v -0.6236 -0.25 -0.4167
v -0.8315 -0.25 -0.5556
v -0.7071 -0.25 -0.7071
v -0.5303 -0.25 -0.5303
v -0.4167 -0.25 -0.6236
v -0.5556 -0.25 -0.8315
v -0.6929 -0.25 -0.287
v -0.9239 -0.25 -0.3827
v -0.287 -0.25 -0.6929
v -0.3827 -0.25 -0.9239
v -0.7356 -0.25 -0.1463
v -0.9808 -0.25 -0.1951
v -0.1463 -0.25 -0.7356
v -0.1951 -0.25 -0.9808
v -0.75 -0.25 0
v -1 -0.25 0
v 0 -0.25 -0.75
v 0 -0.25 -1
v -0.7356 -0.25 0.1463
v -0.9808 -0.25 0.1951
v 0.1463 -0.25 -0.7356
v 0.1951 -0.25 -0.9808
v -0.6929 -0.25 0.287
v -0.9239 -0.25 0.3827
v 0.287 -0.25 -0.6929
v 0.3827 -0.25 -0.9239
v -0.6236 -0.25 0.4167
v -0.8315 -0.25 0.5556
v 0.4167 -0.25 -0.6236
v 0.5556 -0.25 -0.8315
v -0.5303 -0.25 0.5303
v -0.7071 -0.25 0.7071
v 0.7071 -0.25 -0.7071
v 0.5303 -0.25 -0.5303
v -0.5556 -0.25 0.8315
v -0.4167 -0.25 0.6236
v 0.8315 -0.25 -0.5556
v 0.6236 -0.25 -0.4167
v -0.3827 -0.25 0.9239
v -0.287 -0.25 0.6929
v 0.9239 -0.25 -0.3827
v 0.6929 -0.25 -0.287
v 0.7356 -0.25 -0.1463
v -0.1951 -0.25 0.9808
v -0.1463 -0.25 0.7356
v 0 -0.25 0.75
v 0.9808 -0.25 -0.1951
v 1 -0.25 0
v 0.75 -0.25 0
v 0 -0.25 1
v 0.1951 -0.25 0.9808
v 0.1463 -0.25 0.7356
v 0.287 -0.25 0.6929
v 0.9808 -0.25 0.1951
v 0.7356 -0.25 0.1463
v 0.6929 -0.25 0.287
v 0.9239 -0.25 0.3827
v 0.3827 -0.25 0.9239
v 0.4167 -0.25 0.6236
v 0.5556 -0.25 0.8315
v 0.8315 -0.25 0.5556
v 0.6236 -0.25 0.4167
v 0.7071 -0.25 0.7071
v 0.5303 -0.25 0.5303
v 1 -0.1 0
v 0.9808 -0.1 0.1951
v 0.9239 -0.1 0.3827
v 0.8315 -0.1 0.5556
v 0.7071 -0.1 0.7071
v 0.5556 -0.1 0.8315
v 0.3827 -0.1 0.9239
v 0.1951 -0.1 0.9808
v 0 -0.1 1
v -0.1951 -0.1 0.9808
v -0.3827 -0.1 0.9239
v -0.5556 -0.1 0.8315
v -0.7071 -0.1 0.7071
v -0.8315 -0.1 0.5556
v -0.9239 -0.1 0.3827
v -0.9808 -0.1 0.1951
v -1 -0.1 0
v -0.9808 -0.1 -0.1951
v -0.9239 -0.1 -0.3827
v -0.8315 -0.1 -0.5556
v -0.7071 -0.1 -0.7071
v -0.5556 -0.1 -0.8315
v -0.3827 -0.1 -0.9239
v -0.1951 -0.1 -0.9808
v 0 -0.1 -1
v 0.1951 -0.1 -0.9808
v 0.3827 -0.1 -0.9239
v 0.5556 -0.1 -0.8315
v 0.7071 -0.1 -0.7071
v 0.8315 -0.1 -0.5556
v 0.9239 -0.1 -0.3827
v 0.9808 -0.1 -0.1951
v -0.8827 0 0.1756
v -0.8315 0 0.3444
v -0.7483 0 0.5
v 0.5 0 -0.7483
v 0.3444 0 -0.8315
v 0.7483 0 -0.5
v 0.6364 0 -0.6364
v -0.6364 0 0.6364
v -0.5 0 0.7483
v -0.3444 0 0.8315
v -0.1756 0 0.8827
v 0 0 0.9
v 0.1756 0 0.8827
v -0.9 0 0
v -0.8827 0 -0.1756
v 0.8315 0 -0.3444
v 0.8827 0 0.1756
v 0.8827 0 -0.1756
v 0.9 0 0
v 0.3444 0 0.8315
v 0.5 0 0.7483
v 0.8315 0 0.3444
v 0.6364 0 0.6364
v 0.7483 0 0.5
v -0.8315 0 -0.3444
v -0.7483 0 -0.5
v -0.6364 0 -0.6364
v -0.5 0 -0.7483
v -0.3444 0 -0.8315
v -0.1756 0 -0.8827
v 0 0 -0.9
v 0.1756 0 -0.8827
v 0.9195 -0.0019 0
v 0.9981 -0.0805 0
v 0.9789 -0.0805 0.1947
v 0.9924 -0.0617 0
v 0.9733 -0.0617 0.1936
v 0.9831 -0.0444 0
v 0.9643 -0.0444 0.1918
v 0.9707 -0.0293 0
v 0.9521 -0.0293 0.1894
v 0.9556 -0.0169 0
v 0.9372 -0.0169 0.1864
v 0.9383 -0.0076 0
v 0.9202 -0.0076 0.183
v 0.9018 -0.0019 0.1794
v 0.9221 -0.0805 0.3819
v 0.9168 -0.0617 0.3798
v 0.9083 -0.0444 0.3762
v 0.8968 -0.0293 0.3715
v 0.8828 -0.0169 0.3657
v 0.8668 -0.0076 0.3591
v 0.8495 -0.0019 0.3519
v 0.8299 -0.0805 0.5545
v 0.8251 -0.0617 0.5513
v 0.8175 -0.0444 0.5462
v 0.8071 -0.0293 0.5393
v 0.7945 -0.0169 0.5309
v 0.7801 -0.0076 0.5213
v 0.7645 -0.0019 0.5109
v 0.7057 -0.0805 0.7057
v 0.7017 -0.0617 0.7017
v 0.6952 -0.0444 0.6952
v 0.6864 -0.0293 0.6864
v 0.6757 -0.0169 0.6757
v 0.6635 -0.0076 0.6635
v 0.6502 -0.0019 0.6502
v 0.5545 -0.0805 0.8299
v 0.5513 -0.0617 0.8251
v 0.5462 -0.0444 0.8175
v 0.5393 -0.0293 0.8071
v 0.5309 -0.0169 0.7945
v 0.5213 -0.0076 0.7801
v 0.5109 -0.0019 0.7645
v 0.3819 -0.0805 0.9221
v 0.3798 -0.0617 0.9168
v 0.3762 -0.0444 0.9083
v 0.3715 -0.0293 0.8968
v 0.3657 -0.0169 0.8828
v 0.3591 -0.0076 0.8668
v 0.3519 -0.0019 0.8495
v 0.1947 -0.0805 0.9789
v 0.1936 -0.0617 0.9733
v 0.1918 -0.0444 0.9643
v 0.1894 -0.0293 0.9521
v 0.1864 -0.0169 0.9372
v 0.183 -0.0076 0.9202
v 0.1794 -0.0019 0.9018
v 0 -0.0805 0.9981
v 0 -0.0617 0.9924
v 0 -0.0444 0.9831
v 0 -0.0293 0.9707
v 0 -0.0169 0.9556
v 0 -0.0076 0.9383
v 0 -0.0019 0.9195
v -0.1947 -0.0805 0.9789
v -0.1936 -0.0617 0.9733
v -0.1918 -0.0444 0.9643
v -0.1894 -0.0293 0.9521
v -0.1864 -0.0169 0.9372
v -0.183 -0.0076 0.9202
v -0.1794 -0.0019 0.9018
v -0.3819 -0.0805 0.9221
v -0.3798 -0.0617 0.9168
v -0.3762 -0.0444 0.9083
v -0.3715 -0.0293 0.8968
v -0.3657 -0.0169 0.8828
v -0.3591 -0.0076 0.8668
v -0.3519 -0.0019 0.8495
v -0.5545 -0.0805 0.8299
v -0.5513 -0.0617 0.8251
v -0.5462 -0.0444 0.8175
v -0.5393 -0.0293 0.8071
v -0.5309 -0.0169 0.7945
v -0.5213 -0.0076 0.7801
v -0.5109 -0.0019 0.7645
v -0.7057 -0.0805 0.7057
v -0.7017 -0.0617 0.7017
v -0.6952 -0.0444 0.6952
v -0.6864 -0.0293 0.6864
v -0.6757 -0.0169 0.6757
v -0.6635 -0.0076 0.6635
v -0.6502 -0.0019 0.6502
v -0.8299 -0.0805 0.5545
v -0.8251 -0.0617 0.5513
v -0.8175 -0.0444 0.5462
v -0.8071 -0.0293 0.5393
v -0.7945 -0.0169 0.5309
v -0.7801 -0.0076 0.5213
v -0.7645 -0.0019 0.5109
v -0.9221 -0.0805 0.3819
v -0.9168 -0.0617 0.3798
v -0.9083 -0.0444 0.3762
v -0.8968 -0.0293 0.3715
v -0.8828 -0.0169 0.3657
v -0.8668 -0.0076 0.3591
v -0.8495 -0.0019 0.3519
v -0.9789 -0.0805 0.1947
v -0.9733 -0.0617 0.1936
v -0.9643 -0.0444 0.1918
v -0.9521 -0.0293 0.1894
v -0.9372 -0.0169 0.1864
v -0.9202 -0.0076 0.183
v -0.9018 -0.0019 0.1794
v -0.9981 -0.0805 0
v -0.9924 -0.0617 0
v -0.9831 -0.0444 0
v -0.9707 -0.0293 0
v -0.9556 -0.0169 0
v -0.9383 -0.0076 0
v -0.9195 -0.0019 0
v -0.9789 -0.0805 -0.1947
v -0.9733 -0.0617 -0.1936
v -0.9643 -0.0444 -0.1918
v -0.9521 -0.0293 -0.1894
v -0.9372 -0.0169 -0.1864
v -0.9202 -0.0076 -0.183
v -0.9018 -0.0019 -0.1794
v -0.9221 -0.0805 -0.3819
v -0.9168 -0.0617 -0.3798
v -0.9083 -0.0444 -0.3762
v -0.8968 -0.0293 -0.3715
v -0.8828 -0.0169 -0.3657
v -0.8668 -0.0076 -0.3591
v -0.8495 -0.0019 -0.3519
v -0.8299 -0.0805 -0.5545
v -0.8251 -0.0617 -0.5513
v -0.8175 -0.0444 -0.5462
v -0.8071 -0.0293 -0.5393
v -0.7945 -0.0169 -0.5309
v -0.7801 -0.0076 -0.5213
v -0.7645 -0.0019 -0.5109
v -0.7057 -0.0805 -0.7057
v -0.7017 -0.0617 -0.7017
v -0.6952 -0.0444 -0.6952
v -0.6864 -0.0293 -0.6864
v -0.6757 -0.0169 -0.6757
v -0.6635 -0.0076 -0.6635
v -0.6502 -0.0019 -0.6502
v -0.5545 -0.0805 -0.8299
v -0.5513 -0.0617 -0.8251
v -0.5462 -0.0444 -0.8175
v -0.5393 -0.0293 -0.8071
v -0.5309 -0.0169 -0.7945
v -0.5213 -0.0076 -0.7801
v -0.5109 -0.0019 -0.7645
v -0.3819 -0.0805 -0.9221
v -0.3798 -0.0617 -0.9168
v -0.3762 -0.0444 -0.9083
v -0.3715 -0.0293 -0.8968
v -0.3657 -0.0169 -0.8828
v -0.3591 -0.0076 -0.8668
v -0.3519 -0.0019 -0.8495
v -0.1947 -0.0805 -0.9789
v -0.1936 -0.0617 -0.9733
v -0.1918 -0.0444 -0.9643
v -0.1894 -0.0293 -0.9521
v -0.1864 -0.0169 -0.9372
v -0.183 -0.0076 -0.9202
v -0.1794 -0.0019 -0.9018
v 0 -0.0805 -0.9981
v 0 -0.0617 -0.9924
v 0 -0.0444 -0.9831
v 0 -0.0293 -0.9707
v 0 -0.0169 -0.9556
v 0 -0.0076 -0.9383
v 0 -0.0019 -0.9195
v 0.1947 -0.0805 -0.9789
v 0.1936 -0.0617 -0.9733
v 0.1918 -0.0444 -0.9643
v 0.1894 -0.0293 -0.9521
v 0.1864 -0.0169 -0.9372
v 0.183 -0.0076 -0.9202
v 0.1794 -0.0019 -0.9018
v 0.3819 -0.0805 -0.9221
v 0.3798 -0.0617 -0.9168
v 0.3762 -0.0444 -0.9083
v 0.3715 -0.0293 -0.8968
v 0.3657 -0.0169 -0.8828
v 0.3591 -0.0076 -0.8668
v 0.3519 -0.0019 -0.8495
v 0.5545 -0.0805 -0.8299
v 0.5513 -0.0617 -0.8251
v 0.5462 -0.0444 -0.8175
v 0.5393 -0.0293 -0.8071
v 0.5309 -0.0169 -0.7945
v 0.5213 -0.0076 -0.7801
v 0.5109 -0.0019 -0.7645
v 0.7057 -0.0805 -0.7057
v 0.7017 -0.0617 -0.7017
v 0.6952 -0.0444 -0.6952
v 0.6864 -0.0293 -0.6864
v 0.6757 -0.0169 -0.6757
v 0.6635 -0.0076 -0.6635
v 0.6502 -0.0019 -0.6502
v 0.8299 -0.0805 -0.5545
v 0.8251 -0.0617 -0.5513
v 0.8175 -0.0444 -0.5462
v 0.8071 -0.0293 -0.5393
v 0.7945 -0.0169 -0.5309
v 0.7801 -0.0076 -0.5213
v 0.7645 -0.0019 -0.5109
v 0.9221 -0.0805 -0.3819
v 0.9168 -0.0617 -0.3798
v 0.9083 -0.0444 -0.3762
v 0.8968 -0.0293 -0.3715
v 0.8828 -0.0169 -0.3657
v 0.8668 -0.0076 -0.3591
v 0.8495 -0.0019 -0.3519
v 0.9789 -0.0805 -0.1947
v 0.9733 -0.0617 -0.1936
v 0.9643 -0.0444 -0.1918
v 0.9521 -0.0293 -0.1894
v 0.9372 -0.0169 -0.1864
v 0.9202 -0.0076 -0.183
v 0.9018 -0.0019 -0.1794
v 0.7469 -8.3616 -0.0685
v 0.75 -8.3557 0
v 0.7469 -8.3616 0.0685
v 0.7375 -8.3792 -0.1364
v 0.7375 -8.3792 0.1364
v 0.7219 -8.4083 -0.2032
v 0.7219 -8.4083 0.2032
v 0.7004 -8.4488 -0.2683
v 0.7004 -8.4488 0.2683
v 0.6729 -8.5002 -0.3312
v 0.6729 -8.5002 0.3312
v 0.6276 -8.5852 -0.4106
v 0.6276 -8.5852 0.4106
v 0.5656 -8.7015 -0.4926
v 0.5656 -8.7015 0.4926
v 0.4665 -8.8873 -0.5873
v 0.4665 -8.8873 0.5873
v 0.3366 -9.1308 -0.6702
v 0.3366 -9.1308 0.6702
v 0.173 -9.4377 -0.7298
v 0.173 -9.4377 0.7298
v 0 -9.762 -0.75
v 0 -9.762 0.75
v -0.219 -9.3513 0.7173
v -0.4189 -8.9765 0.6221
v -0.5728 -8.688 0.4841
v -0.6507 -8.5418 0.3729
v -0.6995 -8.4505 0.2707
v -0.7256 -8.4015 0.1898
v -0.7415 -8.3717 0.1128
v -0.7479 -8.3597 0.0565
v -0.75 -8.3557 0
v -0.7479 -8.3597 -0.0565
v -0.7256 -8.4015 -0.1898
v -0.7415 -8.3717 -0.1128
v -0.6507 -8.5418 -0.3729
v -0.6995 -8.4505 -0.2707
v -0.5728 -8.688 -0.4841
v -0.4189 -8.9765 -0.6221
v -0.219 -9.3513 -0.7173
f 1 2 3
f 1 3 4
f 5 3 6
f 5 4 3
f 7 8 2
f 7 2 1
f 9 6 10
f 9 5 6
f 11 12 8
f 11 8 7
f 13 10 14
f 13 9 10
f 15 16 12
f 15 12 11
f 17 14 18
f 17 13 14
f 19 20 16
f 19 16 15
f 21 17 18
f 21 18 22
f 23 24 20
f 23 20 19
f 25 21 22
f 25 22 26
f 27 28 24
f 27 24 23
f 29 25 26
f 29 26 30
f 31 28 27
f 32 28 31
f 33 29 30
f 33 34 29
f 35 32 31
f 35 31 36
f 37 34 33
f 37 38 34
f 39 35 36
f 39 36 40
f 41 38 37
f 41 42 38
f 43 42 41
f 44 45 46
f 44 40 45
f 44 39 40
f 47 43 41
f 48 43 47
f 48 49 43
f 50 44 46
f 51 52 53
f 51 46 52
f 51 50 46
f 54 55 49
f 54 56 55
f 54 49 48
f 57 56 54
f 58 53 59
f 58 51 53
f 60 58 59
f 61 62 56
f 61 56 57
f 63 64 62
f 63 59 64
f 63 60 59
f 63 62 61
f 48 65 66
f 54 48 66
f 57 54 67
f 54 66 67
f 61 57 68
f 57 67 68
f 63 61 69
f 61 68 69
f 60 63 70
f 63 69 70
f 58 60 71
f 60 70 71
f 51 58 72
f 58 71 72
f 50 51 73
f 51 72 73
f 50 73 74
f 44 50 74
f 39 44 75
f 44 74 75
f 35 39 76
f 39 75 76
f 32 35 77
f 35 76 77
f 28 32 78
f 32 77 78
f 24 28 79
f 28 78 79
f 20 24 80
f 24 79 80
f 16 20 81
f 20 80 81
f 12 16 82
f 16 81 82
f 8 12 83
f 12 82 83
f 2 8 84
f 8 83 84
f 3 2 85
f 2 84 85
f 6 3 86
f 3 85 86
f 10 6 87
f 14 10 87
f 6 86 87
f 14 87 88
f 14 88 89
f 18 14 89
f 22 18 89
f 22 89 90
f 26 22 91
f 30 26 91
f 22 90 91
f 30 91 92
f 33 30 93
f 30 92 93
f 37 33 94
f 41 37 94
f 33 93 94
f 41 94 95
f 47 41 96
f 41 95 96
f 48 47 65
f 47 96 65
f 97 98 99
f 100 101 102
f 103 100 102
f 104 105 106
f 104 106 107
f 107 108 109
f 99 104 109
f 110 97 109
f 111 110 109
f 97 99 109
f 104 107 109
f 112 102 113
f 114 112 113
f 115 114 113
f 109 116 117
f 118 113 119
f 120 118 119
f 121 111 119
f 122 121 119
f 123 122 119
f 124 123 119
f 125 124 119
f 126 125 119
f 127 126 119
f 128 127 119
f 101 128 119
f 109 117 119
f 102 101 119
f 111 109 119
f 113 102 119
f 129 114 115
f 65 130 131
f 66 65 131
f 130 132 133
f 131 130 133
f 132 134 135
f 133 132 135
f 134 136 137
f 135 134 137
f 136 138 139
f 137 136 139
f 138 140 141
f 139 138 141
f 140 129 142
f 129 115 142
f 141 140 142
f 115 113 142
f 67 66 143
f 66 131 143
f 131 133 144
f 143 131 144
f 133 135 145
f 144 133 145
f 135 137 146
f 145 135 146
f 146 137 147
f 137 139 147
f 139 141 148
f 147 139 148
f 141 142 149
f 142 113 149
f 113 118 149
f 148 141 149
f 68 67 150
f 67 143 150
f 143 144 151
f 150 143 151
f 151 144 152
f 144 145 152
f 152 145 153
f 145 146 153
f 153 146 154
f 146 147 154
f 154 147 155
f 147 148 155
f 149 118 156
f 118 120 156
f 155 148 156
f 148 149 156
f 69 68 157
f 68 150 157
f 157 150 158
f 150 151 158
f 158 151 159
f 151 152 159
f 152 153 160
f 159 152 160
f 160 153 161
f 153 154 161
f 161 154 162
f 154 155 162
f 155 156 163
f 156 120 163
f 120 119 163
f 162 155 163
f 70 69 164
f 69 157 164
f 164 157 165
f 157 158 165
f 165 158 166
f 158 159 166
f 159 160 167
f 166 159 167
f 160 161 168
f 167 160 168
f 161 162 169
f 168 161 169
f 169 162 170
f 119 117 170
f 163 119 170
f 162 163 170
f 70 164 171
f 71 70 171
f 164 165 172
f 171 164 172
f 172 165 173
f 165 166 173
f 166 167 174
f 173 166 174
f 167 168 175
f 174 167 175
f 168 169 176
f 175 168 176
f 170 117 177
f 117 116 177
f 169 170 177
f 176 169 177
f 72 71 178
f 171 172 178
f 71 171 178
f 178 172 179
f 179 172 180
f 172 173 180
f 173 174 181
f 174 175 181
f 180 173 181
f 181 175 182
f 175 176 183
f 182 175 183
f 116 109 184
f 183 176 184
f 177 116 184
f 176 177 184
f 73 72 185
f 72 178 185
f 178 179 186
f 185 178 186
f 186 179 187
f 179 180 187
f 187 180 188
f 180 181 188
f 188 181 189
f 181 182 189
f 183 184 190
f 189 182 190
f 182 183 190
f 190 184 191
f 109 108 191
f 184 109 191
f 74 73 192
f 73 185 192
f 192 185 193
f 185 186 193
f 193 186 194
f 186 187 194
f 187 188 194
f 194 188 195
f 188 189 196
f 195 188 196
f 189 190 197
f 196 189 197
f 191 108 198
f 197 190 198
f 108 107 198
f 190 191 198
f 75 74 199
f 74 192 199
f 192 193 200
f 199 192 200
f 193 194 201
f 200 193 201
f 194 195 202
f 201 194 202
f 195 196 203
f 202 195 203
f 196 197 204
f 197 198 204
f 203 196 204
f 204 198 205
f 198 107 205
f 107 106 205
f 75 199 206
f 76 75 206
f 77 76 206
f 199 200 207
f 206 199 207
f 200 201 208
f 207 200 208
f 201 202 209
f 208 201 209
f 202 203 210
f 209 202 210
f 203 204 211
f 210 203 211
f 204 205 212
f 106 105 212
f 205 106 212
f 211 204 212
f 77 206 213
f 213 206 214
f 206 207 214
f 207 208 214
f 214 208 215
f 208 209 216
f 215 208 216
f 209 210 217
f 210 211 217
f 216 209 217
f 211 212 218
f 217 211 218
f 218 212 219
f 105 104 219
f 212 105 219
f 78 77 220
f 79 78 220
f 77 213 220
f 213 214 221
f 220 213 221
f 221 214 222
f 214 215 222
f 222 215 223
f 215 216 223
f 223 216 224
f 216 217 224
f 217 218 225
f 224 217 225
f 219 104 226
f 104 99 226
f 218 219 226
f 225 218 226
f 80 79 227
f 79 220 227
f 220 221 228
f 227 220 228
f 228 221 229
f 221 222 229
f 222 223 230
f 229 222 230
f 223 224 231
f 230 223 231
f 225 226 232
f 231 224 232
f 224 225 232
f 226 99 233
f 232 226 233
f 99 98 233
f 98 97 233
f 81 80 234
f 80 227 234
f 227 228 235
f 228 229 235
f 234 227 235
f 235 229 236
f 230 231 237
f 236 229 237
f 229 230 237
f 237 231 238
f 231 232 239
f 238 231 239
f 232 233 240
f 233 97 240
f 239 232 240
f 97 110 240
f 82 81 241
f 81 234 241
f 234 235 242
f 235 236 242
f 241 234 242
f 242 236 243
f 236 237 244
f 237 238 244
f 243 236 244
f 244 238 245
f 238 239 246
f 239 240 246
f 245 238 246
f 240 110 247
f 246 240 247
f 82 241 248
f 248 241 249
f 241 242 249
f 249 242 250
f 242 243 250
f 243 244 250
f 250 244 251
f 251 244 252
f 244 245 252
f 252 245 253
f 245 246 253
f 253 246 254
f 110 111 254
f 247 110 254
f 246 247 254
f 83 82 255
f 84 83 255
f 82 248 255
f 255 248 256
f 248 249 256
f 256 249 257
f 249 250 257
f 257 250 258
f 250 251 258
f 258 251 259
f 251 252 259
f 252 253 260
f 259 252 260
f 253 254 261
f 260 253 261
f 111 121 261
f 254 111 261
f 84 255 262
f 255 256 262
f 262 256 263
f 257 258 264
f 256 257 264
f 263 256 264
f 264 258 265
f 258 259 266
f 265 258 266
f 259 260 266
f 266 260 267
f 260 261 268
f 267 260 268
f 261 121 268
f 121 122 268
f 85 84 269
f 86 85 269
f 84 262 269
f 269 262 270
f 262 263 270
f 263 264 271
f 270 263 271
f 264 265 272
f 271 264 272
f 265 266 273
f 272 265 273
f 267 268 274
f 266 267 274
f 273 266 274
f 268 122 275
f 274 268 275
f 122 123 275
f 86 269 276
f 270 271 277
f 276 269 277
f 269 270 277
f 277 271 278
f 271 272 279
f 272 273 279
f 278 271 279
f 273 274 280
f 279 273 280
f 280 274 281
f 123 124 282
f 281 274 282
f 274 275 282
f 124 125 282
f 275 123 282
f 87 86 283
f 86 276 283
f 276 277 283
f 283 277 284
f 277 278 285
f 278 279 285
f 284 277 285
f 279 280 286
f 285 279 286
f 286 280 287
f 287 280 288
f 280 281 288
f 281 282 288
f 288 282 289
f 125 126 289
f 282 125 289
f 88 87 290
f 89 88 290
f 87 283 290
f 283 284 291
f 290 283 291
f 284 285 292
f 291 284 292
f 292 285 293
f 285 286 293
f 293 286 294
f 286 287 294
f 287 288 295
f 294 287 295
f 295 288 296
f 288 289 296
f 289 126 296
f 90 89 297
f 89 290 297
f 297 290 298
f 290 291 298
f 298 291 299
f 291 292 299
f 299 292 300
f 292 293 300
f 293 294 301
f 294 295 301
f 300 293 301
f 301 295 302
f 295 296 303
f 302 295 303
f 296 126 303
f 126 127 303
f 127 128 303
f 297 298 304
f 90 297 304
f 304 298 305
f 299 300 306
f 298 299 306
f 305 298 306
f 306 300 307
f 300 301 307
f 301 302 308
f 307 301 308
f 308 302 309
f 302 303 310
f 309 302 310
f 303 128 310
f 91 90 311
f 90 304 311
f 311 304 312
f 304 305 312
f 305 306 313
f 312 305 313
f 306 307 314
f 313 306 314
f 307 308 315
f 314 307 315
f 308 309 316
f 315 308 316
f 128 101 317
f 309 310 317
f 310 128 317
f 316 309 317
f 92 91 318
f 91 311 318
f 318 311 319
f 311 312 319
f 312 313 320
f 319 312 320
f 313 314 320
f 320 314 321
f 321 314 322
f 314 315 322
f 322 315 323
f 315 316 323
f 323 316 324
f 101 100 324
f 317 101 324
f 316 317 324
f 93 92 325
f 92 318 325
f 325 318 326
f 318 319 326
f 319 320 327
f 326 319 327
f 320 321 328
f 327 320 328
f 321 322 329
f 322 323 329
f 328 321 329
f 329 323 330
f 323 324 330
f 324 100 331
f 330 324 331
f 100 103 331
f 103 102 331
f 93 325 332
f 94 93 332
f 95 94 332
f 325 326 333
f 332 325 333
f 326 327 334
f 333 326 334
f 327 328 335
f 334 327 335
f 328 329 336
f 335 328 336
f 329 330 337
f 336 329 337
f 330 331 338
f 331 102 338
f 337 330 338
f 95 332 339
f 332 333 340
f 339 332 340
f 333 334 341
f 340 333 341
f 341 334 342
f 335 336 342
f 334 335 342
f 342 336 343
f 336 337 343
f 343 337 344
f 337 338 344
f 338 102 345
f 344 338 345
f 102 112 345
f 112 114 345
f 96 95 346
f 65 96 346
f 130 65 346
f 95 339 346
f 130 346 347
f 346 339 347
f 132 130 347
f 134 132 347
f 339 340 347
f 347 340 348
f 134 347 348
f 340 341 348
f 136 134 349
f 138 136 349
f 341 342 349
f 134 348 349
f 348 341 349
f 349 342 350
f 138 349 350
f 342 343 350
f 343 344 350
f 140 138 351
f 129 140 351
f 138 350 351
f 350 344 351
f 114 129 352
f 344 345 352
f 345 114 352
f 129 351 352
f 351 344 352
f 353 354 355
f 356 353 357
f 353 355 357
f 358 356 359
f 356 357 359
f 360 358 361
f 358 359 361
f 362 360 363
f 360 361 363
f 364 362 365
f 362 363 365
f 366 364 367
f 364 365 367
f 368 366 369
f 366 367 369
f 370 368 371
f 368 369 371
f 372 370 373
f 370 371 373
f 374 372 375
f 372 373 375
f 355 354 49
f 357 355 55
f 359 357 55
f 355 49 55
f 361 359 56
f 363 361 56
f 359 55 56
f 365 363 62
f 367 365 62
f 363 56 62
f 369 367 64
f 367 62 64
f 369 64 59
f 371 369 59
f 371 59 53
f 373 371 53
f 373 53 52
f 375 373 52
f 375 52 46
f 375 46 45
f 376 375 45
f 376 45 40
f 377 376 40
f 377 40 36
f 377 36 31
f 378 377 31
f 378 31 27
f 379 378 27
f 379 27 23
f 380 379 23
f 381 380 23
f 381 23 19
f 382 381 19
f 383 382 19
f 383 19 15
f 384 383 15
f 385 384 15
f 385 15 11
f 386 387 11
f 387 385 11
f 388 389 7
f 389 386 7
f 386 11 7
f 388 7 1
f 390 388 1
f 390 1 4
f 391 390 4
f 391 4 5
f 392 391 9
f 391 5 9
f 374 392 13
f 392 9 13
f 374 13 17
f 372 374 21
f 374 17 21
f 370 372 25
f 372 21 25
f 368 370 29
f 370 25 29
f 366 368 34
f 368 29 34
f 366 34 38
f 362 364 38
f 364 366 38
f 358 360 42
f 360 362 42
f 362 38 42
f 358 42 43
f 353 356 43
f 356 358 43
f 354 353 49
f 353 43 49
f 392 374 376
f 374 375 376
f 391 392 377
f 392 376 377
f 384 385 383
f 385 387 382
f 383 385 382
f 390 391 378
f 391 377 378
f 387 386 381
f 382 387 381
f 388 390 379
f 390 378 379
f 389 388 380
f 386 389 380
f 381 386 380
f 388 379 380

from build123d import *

# Parameters (mm, degrees)
F0_R          = 0.75
F1_DEPTH      = 10
F0_R_2        = 1
F2_DEPTH      = 0.25
F3_R          = 0.1
F5_DEPTH      = 25
F5_DEPTH_BACK = 25


with BuildPart() as f1:
    # F0 (on Front) → F1 (new body)
    with BuildSketch(Plane.XZ):
        Circle(F0_R)
    extrude(amount=F1_DEPTH)

    # F0 (on Front) → F2 (join)
    with BuildSketch(Plane.XZ):
        Circle(F0_R_2)
        Circle(F0_R, mode=Mode.SUBTRACT)
    extrude(amount=F2_DEPTH)

    # F3
    f3_edges = [f1.edges().sort_by_distance(p)[0] for p in [
        (-1, 0, 0),
    ]]
    fillet(f3_edges, radius=F3_R)

    # F4 (on Top) → F5 (cut, two sides)
    with BuildSketch(Plane.XY) as f5_sk:
        Polygon((-0.999971, -8.26199), (-0.999971, -10.461405), (0.999971, -10.461405), (0.999971, -8.26199), (0.799971, -8.26199), (0, -9.762005), (-0.799971, -8.26199), align=None)
    extrude(amount=F5_DEPTH, mode=Mode.SUBTRACT)
    extrude(f5_sk.sketch, amount=-F5_DEPTH_BACK, mode=Mode.SUBTRACT)


solid = f1.part
